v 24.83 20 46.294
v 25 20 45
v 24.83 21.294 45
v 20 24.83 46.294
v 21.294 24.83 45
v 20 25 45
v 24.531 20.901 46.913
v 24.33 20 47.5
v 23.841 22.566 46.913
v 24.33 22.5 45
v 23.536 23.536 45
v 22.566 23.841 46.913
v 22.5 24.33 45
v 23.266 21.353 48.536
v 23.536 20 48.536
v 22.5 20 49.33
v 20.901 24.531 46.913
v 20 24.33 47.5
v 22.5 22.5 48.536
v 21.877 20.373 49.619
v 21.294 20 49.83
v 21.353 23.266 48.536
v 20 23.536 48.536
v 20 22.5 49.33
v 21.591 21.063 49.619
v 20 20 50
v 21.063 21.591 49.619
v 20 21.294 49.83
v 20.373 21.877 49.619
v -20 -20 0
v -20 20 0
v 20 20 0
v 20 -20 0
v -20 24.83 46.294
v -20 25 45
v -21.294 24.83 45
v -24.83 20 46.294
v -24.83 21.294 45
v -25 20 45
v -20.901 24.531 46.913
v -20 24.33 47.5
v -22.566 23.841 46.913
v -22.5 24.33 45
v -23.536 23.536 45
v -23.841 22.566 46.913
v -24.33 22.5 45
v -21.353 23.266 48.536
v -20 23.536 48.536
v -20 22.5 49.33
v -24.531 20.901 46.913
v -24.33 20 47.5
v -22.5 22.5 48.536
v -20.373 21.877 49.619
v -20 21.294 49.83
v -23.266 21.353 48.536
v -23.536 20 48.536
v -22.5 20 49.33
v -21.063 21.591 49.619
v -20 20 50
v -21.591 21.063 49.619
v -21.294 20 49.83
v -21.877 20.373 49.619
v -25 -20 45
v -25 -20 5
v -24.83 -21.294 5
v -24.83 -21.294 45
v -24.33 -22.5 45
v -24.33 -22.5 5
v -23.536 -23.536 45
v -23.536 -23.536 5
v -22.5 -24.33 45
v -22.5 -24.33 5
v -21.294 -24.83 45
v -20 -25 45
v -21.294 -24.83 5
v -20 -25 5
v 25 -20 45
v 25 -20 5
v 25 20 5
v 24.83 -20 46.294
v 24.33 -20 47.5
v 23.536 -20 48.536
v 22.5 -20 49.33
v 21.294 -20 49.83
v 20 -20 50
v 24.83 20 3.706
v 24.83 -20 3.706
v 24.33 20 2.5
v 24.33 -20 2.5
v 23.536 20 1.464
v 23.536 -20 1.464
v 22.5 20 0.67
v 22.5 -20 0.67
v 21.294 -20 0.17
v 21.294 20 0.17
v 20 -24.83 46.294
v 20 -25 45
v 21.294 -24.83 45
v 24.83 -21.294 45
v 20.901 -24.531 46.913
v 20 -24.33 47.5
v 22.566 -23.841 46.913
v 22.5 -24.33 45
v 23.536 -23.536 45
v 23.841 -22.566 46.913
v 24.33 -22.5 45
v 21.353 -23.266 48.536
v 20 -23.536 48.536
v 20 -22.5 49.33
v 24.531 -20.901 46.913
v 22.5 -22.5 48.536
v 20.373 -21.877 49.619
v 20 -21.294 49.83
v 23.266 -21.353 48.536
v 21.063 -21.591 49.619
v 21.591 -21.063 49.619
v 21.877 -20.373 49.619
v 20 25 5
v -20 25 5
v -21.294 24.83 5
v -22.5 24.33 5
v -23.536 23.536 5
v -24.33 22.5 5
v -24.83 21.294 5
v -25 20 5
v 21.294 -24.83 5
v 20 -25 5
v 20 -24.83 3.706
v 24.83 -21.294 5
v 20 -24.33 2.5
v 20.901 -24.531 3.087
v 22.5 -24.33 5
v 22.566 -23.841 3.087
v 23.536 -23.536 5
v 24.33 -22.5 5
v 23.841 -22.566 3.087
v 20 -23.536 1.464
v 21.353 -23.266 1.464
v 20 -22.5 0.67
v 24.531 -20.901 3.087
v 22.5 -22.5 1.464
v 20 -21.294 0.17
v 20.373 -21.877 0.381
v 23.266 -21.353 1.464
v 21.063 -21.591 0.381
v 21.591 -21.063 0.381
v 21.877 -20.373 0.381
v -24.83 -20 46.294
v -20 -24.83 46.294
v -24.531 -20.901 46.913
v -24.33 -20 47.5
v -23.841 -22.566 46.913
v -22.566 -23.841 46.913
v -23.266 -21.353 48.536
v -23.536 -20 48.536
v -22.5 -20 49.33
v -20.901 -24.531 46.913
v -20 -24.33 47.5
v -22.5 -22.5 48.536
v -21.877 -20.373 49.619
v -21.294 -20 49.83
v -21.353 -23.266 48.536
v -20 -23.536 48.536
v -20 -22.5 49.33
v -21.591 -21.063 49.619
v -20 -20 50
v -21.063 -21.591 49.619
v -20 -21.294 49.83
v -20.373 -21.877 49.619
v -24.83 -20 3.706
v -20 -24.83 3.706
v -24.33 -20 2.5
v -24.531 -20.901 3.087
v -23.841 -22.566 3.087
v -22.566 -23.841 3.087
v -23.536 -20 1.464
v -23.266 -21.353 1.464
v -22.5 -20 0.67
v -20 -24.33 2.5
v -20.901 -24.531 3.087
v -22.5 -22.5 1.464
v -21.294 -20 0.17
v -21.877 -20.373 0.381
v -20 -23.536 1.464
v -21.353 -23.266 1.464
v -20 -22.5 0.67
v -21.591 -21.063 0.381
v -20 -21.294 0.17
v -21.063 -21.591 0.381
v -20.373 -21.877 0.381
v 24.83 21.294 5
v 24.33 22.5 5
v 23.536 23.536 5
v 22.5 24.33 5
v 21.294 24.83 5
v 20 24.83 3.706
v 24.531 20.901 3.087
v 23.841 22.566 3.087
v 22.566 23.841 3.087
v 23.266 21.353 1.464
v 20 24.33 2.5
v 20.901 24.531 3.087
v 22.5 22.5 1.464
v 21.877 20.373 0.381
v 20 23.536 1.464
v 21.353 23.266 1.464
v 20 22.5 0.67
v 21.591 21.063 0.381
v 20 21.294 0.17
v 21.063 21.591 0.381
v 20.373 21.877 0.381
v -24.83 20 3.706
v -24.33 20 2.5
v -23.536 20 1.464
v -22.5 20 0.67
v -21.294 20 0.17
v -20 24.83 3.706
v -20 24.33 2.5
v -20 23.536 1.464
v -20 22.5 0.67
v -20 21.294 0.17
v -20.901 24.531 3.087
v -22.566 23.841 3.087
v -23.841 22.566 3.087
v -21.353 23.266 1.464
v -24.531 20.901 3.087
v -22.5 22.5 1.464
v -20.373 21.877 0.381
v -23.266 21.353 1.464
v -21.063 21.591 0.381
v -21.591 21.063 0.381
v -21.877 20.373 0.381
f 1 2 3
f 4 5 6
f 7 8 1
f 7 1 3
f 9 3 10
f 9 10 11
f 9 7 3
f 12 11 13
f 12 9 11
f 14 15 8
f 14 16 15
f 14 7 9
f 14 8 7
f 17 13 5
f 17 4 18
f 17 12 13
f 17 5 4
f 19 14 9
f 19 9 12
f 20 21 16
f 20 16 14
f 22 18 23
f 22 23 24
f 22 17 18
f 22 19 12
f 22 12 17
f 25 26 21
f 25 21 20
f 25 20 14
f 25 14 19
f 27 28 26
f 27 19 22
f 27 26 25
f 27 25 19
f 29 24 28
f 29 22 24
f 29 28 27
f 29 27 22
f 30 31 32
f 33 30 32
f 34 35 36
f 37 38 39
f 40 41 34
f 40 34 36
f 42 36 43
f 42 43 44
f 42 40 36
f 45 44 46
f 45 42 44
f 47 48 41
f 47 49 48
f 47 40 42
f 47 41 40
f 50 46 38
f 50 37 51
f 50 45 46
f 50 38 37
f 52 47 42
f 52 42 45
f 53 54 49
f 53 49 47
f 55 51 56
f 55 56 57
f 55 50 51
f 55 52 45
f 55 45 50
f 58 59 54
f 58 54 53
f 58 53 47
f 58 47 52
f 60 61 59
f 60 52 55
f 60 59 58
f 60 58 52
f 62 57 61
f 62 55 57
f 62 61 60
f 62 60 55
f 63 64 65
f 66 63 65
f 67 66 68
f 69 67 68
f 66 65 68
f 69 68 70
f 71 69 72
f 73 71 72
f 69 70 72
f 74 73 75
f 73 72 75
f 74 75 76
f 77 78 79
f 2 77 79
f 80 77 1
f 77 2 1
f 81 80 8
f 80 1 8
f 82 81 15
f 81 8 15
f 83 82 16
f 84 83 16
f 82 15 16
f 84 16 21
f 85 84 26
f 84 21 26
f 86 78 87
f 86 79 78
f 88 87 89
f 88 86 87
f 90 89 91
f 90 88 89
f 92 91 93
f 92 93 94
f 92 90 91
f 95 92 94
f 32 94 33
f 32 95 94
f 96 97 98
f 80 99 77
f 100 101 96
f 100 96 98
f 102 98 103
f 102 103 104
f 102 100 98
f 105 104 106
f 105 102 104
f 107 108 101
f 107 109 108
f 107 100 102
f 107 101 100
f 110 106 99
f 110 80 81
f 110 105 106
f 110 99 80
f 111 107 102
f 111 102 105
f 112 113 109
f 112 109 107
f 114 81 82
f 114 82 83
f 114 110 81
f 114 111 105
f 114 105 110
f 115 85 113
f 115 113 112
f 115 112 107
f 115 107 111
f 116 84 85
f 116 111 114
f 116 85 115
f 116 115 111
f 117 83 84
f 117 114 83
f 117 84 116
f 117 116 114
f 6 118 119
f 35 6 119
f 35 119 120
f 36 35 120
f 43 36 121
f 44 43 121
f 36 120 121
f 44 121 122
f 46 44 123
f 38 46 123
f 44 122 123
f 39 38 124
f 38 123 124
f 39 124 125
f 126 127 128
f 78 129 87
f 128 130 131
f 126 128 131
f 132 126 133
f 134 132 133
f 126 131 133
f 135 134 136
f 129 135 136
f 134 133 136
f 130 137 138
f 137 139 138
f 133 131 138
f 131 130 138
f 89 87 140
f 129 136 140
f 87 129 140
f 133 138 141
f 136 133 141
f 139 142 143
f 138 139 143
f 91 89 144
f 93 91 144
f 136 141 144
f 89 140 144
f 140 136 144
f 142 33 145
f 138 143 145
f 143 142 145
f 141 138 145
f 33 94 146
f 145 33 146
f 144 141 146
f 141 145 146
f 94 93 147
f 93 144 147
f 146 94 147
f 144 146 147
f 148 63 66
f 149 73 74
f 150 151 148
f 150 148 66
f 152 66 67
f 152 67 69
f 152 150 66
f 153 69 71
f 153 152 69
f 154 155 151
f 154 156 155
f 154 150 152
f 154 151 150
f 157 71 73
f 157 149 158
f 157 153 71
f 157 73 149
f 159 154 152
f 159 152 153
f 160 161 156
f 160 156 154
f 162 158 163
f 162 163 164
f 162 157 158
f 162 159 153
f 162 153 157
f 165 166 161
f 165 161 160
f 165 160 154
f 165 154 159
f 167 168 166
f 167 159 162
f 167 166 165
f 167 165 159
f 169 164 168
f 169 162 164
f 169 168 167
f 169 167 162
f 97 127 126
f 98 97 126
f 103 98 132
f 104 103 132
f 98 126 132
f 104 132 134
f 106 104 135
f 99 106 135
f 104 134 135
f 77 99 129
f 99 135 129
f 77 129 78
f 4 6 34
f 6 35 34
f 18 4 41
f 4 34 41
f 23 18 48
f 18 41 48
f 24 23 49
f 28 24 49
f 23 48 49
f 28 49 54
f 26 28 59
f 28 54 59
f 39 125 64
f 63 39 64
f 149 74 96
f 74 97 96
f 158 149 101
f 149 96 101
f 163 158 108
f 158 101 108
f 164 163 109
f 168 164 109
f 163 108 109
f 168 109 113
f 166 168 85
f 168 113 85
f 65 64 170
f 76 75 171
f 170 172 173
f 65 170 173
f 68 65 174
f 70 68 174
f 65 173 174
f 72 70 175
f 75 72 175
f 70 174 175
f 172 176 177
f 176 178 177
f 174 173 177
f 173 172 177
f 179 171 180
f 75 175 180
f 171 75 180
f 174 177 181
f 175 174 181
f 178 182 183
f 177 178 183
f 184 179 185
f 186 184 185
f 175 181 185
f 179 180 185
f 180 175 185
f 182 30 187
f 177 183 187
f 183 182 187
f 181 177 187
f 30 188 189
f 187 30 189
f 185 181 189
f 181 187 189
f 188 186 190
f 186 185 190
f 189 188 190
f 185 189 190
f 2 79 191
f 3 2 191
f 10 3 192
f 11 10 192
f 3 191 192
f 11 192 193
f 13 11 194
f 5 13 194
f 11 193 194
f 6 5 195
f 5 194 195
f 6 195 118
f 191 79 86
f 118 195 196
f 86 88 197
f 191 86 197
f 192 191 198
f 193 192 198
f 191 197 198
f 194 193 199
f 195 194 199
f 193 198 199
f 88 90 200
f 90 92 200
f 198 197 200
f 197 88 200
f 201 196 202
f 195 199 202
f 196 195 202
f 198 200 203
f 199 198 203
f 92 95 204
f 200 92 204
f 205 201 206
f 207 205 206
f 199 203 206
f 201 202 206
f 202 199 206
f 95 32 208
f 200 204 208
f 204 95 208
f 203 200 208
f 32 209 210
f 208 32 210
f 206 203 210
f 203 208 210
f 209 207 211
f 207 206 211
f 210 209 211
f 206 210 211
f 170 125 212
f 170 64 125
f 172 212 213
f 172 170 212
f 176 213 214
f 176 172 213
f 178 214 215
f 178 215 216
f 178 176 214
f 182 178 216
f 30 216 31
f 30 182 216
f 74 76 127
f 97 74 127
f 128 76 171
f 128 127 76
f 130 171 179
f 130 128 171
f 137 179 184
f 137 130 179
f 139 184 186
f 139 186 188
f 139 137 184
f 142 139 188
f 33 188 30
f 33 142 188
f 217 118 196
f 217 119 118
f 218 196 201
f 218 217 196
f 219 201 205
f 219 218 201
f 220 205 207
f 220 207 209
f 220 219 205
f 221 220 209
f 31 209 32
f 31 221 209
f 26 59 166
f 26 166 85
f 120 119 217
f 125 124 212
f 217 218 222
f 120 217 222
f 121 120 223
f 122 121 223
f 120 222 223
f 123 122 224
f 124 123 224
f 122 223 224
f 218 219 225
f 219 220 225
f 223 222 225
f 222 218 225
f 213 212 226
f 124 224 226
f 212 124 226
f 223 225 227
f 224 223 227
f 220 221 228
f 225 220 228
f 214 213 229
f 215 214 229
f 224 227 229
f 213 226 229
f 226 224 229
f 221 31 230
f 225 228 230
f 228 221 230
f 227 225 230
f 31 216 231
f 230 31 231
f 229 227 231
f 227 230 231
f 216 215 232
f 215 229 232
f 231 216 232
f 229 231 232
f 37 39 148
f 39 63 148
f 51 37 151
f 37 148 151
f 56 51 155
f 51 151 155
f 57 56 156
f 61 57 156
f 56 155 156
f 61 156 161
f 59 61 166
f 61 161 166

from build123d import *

# Parameters (mm, degrees)
F1_DEPTH = 50
F2_R     = 5
F3_R     = 5


with BuildPart() as f1:
    # F0 (on Top) → F1 (new body)
    with BuildSketch(Plane.XY):
        with BuildLine():
            Line((20, 25), (-20, 25))
            ThreePointArc((-20, 25), (-23.5355339059, 23.5355339059), (-25, 20))
            Line((-25, 20), (-25, -20))
            ThreePointArc((-25, -20), (-23.5355339059, -23.5355339059), (-20, -25))
            Line((-20, -25), (20, -25))
            ThreePointArc((20, -25), (23.5355339059, -23.5355339059), (25, -20))
            Line((25, -20), (25, 20))
            ThreePointArc((25, 20), (23.5355339059, 23.5355339059), (20, 25))
        make_face()
    extrude(amount=F1_DEPTH)

    # F2
    f2_edges = [f1.edges().sort_by_distance(p)[0] for p in [
        (25, 0, 50),
    ]]
    fillet(f2_edges, radius=F2_R)

    # F3
    f3_edges = [f1.edges().sort_by_distance(p)[0] for p in [
        (0, 25, 0),
    ]]
    fillet(f3_edges, radius=F3_R)


solid = f1.part
